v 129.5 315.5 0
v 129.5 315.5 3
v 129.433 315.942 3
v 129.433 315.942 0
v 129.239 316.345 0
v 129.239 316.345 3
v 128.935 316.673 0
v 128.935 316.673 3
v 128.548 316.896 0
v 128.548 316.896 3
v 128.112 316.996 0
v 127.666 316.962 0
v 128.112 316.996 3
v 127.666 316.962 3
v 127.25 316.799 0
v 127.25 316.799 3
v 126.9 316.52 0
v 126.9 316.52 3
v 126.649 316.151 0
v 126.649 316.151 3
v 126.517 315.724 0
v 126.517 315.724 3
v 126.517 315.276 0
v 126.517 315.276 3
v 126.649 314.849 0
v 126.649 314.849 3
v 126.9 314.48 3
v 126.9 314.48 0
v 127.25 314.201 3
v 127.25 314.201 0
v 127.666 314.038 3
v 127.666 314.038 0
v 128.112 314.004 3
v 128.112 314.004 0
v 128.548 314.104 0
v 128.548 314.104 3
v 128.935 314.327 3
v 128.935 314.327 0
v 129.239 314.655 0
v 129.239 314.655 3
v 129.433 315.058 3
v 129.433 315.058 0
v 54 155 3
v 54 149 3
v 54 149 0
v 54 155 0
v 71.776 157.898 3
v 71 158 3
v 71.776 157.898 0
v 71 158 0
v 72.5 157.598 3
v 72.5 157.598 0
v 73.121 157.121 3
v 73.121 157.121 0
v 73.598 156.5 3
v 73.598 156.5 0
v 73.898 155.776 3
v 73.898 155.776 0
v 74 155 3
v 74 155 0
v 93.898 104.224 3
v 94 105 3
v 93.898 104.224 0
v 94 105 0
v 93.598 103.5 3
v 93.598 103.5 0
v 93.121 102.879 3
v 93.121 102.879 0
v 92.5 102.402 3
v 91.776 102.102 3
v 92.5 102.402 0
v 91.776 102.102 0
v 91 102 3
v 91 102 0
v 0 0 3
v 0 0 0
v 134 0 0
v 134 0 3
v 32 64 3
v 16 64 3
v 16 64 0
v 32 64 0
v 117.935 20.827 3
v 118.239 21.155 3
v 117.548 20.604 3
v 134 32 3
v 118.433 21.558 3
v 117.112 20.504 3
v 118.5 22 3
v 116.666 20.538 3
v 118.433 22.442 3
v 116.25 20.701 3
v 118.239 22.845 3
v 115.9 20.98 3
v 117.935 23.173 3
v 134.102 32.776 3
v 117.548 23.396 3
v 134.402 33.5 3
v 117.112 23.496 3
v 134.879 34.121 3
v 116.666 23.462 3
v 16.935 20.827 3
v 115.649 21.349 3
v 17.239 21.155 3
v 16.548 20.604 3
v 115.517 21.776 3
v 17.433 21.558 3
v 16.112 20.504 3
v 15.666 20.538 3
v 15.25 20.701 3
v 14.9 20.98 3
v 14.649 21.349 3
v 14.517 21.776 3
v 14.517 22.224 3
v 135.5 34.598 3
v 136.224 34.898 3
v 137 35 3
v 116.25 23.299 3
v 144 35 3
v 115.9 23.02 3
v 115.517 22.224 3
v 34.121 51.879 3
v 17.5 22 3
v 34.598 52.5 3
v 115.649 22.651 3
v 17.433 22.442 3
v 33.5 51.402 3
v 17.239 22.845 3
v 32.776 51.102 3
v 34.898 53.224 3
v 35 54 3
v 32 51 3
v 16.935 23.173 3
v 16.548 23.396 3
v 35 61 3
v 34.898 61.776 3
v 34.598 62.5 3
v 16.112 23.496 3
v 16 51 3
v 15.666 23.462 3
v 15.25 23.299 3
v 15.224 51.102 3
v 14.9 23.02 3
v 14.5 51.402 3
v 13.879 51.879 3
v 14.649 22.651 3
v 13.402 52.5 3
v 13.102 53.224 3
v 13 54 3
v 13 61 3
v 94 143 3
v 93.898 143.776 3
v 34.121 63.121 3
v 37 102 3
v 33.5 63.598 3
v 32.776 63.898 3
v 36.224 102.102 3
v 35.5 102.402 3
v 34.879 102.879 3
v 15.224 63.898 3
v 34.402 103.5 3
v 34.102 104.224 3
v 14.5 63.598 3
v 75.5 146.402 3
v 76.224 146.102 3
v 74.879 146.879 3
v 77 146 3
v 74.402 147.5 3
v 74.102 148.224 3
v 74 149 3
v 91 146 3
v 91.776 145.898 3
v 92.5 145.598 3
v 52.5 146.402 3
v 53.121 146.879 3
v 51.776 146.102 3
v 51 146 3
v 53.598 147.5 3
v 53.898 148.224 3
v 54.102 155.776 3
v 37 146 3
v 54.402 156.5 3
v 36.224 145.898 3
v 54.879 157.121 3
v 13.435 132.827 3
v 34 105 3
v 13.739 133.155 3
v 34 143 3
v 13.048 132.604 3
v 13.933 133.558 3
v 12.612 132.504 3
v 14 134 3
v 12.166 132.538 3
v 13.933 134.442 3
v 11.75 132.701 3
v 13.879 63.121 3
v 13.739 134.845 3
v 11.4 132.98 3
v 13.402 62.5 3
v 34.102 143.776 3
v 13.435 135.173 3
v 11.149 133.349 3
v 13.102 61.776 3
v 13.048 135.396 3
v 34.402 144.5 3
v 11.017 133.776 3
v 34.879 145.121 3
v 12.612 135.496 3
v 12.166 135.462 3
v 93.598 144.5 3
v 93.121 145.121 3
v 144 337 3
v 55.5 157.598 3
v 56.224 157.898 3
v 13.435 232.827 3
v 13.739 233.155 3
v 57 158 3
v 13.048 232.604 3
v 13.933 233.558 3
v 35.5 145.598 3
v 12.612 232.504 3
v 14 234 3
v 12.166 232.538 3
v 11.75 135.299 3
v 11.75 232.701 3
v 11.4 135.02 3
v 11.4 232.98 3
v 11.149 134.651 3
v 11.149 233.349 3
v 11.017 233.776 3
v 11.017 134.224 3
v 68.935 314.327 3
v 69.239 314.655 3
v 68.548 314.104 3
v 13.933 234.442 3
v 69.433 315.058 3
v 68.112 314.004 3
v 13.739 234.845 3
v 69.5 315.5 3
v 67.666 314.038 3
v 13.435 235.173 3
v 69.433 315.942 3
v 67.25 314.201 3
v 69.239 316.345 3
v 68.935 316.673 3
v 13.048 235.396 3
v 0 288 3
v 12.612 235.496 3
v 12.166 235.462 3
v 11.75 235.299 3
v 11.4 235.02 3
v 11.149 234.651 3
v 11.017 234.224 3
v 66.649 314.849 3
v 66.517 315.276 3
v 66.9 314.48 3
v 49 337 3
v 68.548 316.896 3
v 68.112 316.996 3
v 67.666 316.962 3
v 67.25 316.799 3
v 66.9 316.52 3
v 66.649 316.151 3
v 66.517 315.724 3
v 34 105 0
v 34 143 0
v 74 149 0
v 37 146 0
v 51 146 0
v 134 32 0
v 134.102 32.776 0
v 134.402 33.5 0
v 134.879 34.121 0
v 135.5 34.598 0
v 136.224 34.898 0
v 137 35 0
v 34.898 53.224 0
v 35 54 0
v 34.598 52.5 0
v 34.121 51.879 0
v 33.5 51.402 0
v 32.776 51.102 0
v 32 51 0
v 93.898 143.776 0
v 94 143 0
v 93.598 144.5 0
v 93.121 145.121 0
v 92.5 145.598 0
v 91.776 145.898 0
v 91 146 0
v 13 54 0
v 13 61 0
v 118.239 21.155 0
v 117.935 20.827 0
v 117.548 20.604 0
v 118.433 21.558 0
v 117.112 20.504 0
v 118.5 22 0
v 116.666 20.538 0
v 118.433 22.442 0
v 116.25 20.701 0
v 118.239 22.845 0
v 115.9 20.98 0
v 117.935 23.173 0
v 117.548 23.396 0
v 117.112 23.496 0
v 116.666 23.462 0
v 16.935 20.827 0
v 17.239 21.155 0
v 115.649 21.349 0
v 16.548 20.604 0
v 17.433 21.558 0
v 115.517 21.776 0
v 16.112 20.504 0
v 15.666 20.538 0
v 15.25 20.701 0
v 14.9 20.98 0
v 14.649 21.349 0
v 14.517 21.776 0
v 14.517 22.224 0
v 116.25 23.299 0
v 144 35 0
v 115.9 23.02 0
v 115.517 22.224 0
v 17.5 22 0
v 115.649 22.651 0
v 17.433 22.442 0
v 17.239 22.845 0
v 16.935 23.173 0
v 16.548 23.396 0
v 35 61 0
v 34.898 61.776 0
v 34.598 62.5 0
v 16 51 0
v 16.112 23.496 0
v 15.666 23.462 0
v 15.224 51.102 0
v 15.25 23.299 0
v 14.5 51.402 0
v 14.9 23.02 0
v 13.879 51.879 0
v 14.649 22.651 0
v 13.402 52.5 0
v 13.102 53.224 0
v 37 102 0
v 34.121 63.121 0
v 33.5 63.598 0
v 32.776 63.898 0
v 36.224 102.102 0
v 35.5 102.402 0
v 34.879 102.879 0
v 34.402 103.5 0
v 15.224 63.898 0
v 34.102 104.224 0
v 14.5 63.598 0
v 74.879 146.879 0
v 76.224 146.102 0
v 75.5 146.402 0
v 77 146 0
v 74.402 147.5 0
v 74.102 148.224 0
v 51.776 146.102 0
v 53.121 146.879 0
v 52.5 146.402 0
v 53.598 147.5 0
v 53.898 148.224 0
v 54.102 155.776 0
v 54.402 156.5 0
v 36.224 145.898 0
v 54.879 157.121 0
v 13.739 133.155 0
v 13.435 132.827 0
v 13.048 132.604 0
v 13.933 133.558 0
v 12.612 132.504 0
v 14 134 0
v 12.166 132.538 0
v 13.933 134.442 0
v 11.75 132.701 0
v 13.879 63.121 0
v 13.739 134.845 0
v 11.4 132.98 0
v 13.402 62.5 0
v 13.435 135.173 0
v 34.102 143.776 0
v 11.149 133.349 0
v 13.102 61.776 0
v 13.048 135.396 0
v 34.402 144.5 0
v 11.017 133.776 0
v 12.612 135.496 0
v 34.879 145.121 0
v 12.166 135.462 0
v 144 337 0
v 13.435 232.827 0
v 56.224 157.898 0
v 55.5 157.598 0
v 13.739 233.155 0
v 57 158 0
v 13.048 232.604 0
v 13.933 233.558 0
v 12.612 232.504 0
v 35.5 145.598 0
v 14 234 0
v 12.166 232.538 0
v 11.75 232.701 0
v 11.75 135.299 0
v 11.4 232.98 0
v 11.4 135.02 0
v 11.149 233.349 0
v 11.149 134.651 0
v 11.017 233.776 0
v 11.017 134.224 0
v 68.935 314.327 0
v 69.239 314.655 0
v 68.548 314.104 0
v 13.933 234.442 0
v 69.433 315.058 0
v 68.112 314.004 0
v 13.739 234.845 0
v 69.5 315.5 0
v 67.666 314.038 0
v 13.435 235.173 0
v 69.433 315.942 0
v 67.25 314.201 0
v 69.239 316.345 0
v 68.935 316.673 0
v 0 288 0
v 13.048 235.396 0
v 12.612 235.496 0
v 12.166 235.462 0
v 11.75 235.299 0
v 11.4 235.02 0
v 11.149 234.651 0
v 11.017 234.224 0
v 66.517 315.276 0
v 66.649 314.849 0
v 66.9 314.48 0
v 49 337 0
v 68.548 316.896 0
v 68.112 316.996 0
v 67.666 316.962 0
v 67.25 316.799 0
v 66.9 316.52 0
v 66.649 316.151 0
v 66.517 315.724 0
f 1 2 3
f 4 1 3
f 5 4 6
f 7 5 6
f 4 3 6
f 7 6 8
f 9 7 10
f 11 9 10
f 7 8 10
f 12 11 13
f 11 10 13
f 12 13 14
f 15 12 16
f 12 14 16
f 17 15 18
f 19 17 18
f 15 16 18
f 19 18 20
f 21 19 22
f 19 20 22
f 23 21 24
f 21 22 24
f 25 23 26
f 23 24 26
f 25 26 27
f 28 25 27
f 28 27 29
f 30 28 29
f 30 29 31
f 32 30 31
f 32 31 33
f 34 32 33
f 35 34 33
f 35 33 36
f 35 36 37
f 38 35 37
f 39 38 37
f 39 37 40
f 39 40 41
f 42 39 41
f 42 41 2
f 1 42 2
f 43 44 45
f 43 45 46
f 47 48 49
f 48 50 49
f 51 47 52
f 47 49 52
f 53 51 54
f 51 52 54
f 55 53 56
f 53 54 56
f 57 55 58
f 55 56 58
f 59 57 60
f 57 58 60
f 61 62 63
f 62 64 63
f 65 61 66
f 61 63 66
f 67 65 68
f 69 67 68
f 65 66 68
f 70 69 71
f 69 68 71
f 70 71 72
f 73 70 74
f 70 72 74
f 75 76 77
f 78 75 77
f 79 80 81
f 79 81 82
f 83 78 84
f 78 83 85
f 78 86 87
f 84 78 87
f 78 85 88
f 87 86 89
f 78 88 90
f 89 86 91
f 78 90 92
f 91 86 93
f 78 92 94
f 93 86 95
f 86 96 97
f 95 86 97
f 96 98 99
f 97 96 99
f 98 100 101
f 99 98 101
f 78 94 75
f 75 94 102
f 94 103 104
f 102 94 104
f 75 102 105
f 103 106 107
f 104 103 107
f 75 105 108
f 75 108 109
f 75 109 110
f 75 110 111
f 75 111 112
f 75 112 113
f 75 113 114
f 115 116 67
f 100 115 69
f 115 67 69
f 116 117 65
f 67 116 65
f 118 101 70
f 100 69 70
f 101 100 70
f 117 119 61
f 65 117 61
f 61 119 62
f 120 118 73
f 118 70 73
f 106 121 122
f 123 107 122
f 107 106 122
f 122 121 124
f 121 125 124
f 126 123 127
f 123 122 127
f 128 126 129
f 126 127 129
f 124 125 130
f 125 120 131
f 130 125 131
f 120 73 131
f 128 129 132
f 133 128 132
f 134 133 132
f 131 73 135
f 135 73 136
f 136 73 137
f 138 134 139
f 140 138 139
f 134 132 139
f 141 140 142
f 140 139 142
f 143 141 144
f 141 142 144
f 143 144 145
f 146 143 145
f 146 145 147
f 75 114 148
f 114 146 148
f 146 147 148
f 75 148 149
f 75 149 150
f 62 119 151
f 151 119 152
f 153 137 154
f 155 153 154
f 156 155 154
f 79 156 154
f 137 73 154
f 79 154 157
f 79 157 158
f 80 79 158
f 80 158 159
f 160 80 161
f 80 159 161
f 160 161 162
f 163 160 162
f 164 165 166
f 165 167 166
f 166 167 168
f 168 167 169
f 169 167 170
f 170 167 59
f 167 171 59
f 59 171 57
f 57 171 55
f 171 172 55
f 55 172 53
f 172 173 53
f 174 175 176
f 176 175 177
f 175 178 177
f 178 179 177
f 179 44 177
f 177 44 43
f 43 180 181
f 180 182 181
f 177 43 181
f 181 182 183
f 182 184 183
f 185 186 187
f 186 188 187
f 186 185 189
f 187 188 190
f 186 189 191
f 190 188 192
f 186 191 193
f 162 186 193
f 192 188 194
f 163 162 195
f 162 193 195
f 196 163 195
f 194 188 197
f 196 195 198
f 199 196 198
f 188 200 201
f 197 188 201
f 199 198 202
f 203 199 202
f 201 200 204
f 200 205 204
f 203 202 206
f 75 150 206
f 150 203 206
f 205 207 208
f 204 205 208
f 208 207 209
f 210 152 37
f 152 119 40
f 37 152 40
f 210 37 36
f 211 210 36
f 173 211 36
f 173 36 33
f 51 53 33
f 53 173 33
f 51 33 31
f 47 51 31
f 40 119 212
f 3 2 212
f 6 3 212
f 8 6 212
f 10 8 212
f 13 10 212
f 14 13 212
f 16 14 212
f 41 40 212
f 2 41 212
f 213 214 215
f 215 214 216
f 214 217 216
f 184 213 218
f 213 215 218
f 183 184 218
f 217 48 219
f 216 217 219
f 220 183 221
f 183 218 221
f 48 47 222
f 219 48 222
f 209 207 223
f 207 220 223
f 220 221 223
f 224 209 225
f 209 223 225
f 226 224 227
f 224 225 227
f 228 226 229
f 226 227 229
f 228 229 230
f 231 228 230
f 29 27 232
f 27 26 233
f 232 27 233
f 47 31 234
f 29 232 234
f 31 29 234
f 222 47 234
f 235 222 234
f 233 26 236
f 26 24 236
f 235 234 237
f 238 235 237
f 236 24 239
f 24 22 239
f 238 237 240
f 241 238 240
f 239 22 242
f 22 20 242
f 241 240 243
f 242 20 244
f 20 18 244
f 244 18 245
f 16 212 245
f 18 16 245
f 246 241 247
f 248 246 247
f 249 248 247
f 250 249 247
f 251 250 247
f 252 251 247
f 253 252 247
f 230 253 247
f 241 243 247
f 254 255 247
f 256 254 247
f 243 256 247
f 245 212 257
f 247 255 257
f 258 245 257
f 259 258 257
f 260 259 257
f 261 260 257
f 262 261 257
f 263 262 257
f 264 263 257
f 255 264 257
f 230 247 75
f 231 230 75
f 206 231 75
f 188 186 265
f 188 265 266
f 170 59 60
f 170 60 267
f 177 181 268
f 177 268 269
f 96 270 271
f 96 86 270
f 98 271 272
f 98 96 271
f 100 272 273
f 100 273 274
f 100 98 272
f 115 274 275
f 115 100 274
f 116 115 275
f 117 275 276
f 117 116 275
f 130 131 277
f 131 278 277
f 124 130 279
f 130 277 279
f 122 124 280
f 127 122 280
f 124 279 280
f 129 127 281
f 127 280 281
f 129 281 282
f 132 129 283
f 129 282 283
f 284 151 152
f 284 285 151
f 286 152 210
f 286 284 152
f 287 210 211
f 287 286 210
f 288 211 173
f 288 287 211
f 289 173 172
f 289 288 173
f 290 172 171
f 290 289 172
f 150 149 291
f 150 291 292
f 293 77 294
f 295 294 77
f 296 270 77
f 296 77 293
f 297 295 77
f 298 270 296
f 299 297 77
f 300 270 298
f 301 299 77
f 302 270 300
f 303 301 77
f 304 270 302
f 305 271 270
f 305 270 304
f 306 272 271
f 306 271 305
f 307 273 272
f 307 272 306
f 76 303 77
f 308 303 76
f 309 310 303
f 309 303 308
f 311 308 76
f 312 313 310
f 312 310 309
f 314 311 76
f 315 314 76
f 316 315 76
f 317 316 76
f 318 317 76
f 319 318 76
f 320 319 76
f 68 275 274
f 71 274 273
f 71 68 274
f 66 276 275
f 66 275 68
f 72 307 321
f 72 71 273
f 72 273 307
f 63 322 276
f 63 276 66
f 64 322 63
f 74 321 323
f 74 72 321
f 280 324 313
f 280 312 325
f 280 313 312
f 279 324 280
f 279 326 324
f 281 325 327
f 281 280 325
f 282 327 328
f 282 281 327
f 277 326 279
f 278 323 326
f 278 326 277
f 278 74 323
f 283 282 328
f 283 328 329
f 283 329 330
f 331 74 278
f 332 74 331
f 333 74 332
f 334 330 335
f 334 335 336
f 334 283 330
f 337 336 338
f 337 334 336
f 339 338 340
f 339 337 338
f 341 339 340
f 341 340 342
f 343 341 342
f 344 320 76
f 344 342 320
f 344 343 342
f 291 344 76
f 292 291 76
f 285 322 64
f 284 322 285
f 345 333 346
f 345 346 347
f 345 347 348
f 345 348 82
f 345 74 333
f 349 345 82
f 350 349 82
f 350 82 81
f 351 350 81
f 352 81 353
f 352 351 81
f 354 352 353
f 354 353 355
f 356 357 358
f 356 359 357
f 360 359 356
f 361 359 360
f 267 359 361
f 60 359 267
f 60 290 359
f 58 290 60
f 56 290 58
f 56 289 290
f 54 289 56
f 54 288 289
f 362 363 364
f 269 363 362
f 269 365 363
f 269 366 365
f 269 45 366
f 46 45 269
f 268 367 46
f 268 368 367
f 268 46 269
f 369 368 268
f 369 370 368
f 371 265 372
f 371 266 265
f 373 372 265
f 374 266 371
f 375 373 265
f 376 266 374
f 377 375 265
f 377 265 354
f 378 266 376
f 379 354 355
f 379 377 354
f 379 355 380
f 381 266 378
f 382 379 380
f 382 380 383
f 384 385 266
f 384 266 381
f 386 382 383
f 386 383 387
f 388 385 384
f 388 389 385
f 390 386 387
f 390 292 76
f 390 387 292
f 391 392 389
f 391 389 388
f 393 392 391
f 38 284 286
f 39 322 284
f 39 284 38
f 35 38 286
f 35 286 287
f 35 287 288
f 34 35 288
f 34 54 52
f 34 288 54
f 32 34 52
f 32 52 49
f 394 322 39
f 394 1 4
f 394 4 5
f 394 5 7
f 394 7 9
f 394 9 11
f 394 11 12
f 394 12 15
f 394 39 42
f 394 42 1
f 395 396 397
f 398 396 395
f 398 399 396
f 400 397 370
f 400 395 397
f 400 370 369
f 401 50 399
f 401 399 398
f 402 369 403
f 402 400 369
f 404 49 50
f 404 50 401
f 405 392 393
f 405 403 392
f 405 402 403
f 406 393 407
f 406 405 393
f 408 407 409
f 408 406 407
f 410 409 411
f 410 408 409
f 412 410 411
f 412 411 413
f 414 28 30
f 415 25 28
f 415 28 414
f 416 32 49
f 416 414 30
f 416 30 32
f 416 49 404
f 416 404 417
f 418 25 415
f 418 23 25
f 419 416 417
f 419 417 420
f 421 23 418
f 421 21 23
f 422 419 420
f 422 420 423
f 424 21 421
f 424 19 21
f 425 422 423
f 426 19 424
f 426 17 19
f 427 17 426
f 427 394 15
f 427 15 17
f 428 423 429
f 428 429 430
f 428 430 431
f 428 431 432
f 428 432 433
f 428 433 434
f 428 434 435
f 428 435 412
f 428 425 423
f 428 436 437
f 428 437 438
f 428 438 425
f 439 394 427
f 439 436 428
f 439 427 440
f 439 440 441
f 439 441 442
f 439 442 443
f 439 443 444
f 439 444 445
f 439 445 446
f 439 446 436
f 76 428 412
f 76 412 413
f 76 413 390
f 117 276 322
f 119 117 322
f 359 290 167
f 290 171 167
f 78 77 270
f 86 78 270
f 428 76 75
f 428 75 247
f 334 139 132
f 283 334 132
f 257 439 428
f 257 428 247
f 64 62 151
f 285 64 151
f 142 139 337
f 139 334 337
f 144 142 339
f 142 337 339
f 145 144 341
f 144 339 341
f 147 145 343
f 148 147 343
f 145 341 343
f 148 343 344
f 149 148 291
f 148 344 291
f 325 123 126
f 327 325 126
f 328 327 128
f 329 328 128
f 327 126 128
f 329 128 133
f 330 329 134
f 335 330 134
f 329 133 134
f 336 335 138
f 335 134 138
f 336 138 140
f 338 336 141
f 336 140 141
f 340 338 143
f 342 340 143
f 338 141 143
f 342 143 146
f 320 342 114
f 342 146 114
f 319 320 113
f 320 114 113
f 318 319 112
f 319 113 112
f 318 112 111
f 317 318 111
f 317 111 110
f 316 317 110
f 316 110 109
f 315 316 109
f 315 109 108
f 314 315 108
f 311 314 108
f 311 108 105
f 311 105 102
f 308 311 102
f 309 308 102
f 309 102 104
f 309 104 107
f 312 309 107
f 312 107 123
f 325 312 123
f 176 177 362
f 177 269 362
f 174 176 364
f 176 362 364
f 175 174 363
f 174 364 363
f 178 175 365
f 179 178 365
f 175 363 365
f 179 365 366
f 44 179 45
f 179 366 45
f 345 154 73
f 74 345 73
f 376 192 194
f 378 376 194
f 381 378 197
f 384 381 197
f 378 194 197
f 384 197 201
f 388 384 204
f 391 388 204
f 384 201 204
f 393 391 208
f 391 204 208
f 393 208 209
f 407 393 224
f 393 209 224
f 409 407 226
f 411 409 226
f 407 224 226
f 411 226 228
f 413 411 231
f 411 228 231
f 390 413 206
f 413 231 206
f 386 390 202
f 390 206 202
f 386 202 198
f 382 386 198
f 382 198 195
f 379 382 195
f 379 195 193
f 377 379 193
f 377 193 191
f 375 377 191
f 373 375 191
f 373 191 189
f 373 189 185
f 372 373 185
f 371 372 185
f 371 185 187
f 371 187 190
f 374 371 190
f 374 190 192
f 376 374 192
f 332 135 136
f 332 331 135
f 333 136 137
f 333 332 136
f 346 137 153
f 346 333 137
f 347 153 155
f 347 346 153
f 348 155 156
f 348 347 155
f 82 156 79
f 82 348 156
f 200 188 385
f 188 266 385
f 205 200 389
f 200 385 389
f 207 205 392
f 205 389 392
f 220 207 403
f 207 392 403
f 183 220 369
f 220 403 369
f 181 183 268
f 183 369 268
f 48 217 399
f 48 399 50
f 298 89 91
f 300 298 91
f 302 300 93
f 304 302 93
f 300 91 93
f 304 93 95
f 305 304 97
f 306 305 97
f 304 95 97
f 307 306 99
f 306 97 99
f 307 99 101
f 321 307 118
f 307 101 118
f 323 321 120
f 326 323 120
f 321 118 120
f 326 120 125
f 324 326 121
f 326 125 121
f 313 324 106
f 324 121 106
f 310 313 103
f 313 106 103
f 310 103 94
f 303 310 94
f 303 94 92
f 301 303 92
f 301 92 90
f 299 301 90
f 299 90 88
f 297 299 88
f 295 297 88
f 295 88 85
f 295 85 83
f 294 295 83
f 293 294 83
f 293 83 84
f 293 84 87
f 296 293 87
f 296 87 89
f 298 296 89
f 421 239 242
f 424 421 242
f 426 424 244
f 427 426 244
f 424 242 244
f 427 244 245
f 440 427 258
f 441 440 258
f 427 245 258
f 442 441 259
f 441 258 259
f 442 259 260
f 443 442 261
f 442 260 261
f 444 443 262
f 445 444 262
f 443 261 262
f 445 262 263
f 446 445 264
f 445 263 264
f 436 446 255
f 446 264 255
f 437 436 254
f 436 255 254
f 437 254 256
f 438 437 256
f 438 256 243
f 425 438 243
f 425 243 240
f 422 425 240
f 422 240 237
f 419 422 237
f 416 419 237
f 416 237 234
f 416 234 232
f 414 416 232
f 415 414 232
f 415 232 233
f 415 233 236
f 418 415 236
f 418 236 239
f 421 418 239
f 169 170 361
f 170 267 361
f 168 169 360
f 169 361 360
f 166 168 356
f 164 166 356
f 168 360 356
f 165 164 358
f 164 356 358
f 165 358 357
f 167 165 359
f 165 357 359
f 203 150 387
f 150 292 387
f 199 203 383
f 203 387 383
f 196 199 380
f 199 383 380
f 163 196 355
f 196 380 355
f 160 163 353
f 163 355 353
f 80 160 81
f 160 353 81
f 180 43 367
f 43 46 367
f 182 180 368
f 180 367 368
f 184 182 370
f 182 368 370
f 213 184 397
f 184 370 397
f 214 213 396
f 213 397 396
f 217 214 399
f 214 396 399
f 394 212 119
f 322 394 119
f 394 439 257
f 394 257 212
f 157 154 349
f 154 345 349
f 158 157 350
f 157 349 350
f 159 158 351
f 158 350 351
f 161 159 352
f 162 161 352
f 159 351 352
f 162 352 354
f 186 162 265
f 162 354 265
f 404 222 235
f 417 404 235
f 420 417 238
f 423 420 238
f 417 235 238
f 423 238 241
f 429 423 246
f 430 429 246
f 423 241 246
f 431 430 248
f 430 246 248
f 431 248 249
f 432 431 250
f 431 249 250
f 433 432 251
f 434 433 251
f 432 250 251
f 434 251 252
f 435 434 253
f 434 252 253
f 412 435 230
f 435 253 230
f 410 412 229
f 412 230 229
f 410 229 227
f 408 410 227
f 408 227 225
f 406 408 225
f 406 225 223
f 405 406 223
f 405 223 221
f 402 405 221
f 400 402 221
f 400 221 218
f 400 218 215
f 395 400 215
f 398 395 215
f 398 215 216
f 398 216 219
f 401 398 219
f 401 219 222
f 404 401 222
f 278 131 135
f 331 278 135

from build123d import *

# Parameters (mm, degrees)
ESQUISSE1_W                  = 144
ESQUISSE1_H                  = 337
BOSS_EXTRU_1_DEPTH           = 3
ESQUISSE2_R                  = 1.5
ENL_V_MAT_EXTRU_1_DEPTH      = 367.488744711
CHANFREIN1_SIZE              = 49
ENL_V_MAT_EXTRU_2_DEPTH      = 367.488744711
ENL_V_MAT_EXTRU_2_DEPTH_BACK = 367.488744711
ESQUISSE3_W                  = 10
ESQUISSE3_H                  = 35
ESQUISSE4_W                  = 22
ESQUISSE4_H                  = 13
ENL_V_MAT_EXTRU_3_DEPTH      = 367.488744711
ENL_V_MAT_EXTRU_4_DEPTH      = 367.488744711
ENL_V_MAT_EXTRU_7_DEPTH      = 367.488744711
BOSS_EXTRU_3_DEPTH           = 3
CONG_4_R                     = 3


with BuildPart() as part:
    # Esquisse1 → Boss.-Extru.1 (new body)
    with BuildSketch(Plane.XY):
        with Locations((72, 168.5)):
            Rectangle(ESQUISSE1_W, ESQUISSE1_H)
    extrude(amount=BOSS_EXTRU_1_DEPTH)

    # Esquisse2 → Enlèv. mat.-Extru.1 (cut, through all)
    with BuildSketch(Plane.XY.offset(3)):
        with Locations((16, 22)):
            Circle(ESQUISSE2_R)
        with Locations((12.5, 234)):
            Circle(ESQUISSE2_R)
        with Locations((12.5, 134)):
            Circle(ESQUISSE2_R)
        with Locations((68, 315.5)):
            Circle(ESQUISSE2_R)
        with Locations((128, 315.5)):
            Circle(ESQUISSE2_R)
        with Locations((117, 22)):
            Circle(ESQUISSE2_R)
    extrude(amount=-ENL_V_MAT_EXTRU_1_DEPTH, mode=Mode.SUBTRACT)

    # Chanfrein1
    chanfrein1_edges = [part.edges().sort_by_distance(p)[0] for p in [
        (0, 337, 1.5),
    ]]
    chamfer(chanfrein1_edges, length=CHANFREIN1_SIZE)

    # Esquisse3 → Enlèv. mat.-Extru.2 (cut, two sides: drawn at the far end of the back side and taken through both)
    with BuildSketch(Plane.XY.offset(3).offset(-ENL_V_MAT_EXTRU_2_DEPTH_BACK)):
        with Locations((139, 17.5)):
            Rectangle(ESQUISSE3_W, ESQUISSE3_H)
    extrude(amount=ENL_V_MAT_EXTRU_2_DEPTH + ENL_V_MAT_EXTRU_2_DEPTH_BACK, mode=Mode.SUBTRACT)

    # Esquisse4 → Enlèv. mat.-Extru.3 (cut, through all)
    with BuildSketch(Plane.XY.offset(3)):
        with Locations((24, 57.5)):
            Rectangle(ESQUISSE4_W, ESQUISSE4_H)
    extrude(amount=-ENL_V_MAT_EXTRU_3_DEPTH, mode=Mode.SUBTRACT)

    # Esquisse5 → Enlèv. mat.-Extru.4 (cut, through all)
    with BuildSketch(Plane.XY.offset(3)):
        with BuildLine():
            Line((144, 60), (90, 60))
            Line((90, 60), (90, 190))
            ThreePointArc((90, 190), (68.473980144, 267.875312279), (144, 296.576429297))
            Line((144, 296.576429297), (144, 60))
        make_face()
    extrude(amount=-ENL_V_MAT_EXTRU_4_DEPTH, mode=Mode.SUBTRACT)

    # Esquisse9 → Enlèv. mat.-Extru.7 (cut, through all)
    with BuildSketch(Plane.XY.offset(3)):
        Polygon((94, 102), (34, 102), (34, 146), (54, 146), (54, 158), (74, 158), (74, 146), (94, 146), align=None)
    extrude(amount=-ENL_V_MAT_EXTRU_7_DEPTH, mode=Mode.SUBTRACT)

    # Esquisse10 → Boss.-Extru.3 (add)
    with BuildSketch(Plane.XY.offset(3)):
        Polygon((144, 60), (90, 60), (90, 102), (94, 102), (94, 146), (90, 146), (90, 190), (55, 190), (55, 302), (144, 302), align=None)
    extrude(amount=-BOSS_EXTRU_3_DEPTH)

    # Congé4
    cong_4_edges = [part.edges().sort_by_distance(p)[0] for p in [
        (74, 146, 1.5),
        (34, 102, 1.5),
        (34, 146, 1.5),
        (54, 146, 1.5),
        (54, 158, 1.5),
        (74, 158, 1.5),
        (94, 102, 1.5),
        (94, 146, 1.5),
        (134, 35, 1.5),
        (13, 51, 1.5),
        (13, 64, 1.5),
        (35, 64, 1.5),
        (35, 51, 1.5),
    ]]
    fillet(cong_4_edges, radius=CONG_4_R)


solid = part.part
